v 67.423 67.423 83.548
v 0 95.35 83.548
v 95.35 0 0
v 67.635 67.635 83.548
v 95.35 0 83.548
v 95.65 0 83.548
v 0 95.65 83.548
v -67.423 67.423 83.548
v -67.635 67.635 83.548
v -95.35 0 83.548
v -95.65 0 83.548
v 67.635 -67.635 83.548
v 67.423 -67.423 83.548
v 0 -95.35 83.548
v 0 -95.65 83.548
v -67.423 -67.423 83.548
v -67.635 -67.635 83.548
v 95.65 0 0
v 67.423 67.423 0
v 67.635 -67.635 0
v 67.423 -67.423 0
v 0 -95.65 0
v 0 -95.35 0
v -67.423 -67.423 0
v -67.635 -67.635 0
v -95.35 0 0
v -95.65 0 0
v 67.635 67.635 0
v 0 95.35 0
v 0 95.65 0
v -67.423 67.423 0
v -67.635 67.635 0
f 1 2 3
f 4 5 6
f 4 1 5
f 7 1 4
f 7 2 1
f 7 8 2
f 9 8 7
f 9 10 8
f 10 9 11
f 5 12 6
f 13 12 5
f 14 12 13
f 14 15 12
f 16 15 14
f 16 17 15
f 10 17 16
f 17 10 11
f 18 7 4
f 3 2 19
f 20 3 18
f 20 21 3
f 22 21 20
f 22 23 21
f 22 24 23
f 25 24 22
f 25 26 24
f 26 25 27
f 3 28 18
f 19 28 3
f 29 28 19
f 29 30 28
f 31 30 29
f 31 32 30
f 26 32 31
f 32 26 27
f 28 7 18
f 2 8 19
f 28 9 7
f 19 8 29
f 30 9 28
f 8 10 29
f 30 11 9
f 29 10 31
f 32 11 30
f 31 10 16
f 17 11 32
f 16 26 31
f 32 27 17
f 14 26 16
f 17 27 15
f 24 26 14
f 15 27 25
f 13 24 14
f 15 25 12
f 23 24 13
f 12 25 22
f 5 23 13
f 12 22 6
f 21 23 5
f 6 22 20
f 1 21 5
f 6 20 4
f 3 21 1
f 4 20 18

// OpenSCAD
// file: Kresling.scad
function kresling_point(R,n,z=0,i=0,angle=0) =
    [R*cos(360*i/n + angle),R*sin(360*i/n + angle),z];

function facet_a_points(R,n,z,i,alpha) = 
    [kresling_point(R,n,z=0,i=i,angle=0),
     kresling_point(R,n,z=z,i=i+1,angle=alpha),
     kresling_point(R,n,z=z,i=i+2,angle=alpha)];

function facet_b_points(R,n,z,i,alpha) = 
    [kresling_point(R,n,z=0,i=i,angle=0),
     kresling_point(R,n,z=0,i=i+1,angle=0),
     kresling_point(R,n,z=z,i=i+2,angle=alpha)];
     
module draw_facet(F){
    polyhedron(points=[F[0],F[1],F[2],F[0],F[1],F[2]],
           faces = [[1,3,2],
                    [4,6,5],
                    [1,3,6,4],
                    [1,2,5,4],
                    [2,3,6,5]]);};

module draw_kresling_tower(R,n,z,alpha,thickness=0.3,cells=1,single_side=false,facet_a=true,facet_b=true){
    
    for (cell=[1:cells]){
        rotate([0, 0, alpha*(cell-1)]) translate([0,0,z*(cell-1)])
        for (i=[0:single_side ? 0 : n-1]){
           if(facet_a){
               hull(){
                    draw_facet(facet_a_points(R-thickness/2,n,z,i,alpha));
                    draw_facet(facet_a_points(R+thickness/2,n,z,i,alpha));
               };};
           if(facet_b){
               hull(){
                    draw_facet(facet_b_points(R-thickness/2,n,z,i,alpha));
                    draw_facet(facet_b_points(R+thickness/2,n,z,i,alpha));
               };};
        };
    };
}

//// Input parameters
//R = 95.5; // Radius
//n = 8;    // Number of sides
//lambda = 0.5;
//
//alpha = 10; // measured angle
//
//theta = 90 * (1-2/n);
//l = 2*R*cos(theta*(1-lambda));
//
//// considering constant l
//z = sqrt(l*l - 2*R*R*(1 - cos(360/n + alpha)));
//
//// draw tower
//draw_kresling_tower(R,n,z,alpha,thickness = 0.3,no_of_cells=1,single_side=false,facet_a=true,facet_b=true);
// main file
include <Kresling.scad>

// Input parameters
R = 95.5; // Radius
n = 8;    // Number of sides
lambda = 0.5;

theta = 90 * (1-2/n);
l = 2*R*cos(theta*(1-lambda));
a = 2*R*sin(180/n);
b = sqrt(l*l + a*a - 2*l*a*cos(lambda*theta));

echo(a = a);
echo(b = b);
echo(theta = theta);
echo(l = l);

alpha = 0; // measured angle

z = sqrt(l*l - 2*R*R*(1 - cos(720/n + alpha))); // considering constant l
//z = sqrt(b*b - 2*R*R*(1 - cos(360/n + alpha))); // considering constant b
echo(z = z);

// draw tower
draw_kresling_tower(R,n,z,alpha,thickness = 0.3,cells=1,single_side=false,facet_a=true,facet_b=true);
